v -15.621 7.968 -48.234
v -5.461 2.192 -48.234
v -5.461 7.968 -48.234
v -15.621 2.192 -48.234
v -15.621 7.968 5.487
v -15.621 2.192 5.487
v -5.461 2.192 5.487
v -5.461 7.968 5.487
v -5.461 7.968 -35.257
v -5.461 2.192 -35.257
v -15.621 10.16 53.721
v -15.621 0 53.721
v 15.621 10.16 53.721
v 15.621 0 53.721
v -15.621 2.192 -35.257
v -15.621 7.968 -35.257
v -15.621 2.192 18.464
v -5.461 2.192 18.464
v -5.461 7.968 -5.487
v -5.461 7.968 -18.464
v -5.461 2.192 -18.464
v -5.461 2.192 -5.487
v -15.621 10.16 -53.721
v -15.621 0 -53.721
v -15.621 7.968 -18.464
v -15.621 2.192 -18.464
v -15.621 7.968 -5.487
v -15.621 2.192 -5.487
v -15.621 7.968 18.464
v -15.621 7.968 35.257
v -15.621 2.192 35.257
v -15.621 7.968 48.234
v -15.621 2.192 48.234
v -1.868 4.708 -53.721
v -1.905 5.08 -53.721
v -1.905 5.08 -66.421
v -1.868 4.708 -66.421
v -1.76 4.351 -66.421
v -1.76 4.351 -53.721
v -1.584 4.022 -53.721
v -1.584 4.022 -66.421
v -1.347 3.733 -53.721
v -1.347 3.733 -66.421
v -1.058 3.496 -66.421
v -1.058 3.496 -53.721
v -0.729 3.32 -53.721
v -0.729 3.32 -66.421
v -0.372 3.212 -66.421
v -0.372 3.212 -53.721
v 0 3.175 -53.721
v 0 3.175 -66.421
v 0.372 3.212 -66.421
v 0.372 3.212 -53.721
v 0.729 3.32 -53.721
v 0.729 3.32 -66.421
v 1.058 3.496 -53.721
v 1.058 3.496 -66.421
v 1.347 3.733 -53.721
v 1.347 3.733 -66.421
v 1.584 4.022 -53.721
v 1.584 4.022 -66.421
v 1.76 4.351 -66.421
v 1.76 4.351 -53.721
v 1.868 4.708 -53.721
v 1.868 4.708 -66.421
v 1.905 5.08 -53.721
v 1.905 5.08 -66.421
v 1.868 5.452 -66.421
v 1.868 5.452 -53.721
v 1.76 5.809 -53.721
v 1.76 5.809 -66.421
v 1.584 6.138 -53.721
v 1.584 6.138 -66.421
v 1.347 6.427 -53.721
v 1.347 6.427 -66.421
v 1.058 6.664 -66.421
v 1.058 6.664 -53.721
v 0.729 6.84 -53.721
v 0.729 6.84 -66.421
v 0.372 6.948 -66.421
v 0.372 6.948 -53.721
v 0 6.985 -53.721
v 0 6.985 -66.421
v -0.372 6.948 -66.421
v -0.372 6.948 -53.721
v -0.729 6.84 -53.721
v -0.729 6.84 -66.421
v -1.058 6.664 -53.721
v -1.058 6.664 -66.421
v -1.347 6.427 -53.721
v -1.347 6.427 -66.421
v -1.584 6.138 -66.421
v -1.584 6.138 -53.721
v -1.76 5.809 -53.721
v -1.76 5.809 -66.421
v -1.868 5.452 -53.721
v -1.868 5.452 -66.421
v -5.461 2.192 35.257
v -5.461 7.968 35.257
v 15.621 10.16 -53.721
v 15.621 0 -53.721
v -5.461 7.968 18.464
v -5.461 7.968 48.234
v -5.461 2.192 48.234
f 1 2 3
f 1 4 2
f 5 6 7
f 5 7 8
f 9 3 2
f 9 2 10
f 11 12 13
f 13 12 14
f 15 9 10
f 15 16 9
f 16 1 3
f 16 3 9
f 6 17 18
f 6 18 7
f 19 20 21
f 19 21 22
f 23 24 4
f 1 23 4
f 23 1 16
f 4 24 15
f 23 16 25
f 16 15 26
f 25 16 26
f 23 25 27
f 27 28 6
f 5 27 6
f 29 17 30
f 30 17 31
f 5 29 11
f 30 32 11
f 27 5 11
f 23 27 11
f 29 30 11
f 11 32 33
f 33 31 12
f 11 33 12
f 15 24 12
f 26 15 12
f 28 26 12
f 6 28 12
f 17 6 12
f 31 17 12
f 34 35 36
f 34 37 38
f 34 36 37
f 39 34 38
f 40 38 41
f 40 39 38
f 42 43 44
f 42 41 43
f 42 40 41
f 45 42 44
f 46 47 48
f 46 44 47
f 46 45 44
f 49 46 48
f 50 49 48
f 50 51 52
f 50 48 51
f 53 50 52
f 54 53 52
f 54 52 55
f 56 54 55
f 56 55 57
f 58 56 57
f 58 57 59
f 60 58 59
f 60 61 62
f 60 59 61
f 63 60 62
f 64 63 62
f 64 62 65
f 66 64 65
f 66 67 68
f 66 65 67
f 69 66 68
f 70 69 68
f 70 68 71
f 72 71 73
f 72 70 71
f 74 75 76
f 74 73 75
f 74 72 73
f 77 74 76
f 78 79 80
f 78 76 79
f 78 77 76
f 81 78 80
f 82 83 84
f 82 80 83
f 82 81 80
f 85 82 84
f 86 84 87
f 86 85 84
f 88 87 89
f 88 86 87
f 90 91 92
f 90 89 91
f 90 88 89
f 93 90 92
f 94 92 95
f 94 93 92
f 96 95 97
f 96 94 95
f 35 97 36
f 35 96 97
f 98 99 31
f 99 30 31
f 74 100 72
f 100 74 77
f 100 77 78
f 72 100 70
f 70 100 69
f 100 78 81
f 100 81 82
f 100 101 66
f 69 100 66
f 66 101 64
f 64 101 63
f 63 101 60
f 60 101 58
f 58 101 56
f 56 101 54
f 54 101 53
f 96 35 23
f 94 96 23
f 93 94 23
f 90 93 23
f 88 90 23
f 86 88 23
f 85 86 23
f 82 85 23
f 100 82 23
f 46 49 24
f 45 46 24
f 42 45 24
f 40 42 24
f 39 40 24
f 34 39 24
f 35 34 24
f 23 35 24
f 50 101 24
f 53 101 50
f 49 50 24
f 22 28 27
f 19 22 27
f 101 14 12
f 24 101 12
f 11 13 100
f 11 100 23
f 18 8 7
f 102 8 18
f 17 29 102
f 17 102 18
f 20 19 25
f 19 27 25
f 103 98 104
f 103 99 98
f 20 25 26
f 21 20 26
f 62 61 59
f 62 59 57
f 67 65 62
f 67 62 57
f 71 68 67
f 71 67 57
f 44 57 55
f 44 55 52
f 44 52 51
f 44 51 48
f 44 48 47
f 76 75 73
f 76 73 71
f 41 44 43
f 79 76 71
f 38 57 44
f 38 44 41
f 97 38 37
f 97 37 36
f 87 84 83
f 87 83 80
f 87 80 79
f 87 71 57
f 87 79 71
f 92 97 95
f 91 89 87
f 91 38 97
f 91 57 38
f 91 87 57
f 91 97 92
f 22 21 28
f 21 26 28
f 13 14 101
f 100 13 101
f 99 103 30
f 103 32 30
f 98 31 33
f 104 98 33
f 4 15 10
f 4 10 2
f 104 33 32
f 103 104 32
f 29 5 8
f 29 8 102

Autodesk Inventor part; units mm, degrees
ref_plane "YZ Plane" through (0, 0, 0) normal (1, 0, 0) x (0, 1, 0)
ref_plane "XZ Plane" through (0, 0, 0) normal (0, 1, 0) x (-1, 0, 0)
ref_plane "XY Plane" through (0, 0, 0) normal (0, 0, 1) x (1, 0, 0)
sketch "Sketch1" plane through (0, 0, 0) normal (0, 1, 0) x (-1, 0, 0)
  line L0 (15.621, 53.721) -> (-15.621, 53.721)
  line L1 (-15.621, 53.721) -> (-15.621, -53.721)
  line L2 (-15.621, -53.721) -> (15.621, -53.721)
  line L3 (15.621, -53.721) -> (15.621, 53.721)
  line L4 (15.621, 53.721) -> (-15.621, -53.721) construction
  line L5 (-15.621, 53.721) -> (15.621, -53.721) construction
  point P0 (0, 0)
  dimension "d0" = 107.442
  dimension "d1" = 31.242
extrude "Extrusion1" add sketch "Sketch1" along normal blind 10.16
sketch "Sketch2" plane through (-15.621, 0, -53.721) normal (-1, 0, 0) x (0, 0, 1)
  line L0 (0, 0) -> (0, 10.16) projected
  line L1 (0, 5.08) -> (107.442, 5.08) construction
  line L2 (107.442, 0) -> (107.442, 10.16) projected
  line L3 (107.442, 10.16) -> (0, 10.16) projected
  line L4 (53.721, 10.16) -> (53.721, 0) construction
  line L5 (107.442, 0) -> (0, 0) projected
  line L6 (35.2574, 2.1925) -> (48.2344, 2.1925)
  line L7 (48.2344, 2.1925) -> (48.2344, 7.9675)
  line L8 (48.2344, 7.9675) -> (35.2574, 7.9675)
  line L9 (35.2574, 7.9675) -> (35.2574, 2.1925)
  line L10 (35.2574, 2.1925) -> (48.2344, 7.9675) construction
  line L11 (48.2344, 2.1925) -> (35.2574, 7.9675) construction
  line L12 (0, 10.16) -> (53.721, 10.16)
  line L13 (26.8605, 10.16) -> (26.8605, 0) construction
  line L14 (18.4636, 2.1925) -> (5.4866, 2.1925)
  line L15 (5.4866, 2.1925) -> (5.4866, 7.9675)
  line L16 (5.4866, 7.9675) -> (18.4636, 7.9675)
  line L17 (18.4636, 7.9675) -> (18.4636, 2.1925)
  line L18 (18.4636, 2.1925) -> (5.4866, 7.9675) construction
  line L19 (5.4866, 2.1925) -> (18.4636, 7.9675) construction
  line L20 (107.442, 5.08) -> (0, 5.08) construction
  line L21 (72.1846, 2.1925) -> (59.2076, 2.1925)
  line L22 (59.2076, 2.1925) -> (59.2076, 7.9675)
  line L23 (59.2076, 7.9675) -> (72.1846, 7.9675)
  line L24 (72.1846, 7.9675) -> (72.1846, 2.1925)
  line L25 (72.1846, 2.1925) -> (59.2076, 7.9675) construction
  line L26 (59.2076, 2.1925) -> (72.1846, 7.9675) construction
  line L27 (80.5815, 10.16) -> (80.5815, 0) construction
  line L28 (88.9784, 2.1925) -> (101.9554, 2.1925)
  line L29 (101.9554, 2.1925) -> (101.9554, 7.9675)
  line L30 (101.9554, 7.9675) -> (88.9784, 7.9675)
  line L31 (88.9784, 7.9675) -> (88.9784, 2.1925)
  line L32 (88.9784, 2.1925) -> (101.9554, 7.9675) construction
  line L33 (101.9554, 2.1925) -> (88.9784, 7.9675) construction
  point P0 (41.7459, 5.08)
  point P1 (11.9751, 5.08)
  point P2 (65.6961, 5.08)
  point P3 (95.4669, 5.08)
extrude "Extrusion2" cut sketch "Sketch2" against normal blind 10.16 contours L9 L8 L7 L6 | L14 L15 L16 L17 | L21 L22 L23 L24 | L31 L30 L29 L28
sketch "Sketch3" plane through (15.621, 0, -53.721) normal (0, 0, -1) x (-1, 0, 0)
  line L0 (0, 10.16) -> (31.242, 10.16) projected
  line L1 (15.621, 10.16) -> (15.621, 0) construction
  circle A0 centre (15.621, 5.08) radius 1.905
  dimension "d6" = 3.81
extrude "Extrusion3" add sketch "Sketch3" along normal blind 12.7
properties part number "anker_4-port_usb3.0_splitter"
